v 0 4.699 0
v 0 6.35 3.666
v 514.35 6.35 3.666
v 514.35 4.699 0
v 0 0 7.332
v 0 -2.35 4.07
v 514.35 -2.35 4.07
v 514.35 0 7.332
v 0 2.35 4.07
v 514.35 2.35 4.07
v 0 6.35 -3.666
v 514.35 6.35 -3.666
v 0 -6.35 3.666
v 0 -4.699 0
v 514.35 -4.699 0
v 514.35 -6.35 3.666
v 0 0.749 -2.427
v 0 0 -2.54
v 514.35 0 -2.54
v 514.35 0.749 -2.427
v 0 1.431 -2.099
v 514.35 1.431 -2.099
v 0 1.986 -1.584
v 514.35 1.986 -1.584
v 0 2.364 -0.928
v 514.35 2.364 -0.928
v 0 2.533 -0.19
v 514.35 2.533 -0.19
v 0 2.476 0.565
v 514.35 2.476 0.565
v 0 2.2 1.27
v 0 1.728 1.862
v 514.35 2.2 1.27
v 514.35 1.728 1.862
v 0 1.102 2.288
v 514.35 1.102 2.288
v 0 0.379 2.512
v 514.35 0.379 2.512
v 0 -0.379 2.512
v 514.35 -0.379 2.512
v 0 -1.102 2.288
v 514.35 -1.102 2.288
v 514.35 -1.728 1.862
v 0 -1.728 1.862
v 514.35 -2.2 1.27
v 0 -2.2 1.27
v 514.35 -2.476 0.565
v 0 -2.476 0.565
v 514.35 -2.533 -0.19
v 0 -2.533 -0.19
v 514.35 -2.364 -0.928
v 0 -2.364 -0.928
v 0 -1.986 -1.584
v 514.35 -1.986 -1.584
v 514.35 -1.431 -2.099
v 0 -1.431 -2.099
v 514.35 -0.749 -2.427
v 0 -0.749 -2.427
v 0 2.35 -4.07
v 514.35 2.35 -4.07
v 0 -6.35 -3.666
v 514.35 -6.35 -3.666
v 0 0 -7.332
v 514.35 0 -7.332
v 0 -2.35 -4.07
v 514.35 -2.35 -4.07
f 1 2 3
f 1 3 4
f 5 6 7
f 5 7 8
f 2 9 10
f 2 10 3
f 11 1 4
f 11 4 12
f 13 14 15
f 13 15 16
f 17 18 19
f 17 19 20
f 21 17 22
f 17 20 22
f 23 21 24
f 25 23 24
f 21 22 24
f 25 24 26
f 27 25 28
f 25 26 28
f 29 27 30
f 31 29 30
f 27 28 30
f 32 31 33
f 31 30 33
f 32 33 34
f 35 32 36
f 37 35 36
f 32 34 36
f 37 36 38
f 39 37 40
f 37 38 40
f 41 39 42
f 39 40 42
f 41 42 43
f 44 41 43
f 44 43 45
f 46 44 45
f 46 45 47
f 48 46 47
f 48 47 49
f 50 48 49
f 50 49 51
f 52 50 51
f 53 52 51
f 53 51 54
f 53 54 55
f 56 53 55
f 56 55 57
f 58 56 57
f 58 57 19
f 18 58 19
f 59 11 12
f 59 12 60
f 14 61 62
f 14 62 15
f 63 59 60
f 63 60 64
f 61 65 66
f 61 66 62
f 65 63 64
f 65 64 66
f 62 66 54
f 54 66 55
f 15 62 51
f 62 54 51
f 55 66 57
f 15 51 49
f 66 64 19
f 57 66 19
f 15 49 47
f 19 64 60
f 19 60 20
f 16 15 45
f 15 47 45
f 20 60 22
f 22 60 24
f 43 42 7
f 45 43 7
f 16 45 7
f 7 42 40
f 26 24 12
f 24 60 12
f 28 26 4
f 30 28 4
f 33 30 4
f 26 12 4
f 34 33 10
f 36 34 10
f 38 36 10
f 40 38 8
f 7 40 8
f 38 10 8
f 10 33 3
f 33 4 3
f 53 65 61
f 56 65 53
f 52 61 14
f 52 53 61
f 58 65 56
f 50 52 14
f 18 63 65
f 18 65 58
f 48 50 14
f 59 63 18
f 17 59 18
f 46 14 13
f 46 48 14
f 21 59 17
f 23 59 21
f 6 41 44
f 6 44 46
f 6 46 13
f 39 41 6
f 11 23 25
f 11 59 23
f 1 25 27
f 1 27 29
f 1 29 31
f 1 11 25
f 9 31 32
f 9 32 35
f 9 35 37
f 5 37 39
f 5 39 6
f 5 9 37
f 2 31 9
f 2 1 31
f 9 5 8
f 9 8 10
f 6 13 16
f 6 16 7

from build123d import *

# Parameters (mm, degrees)
BOSS_EXTRUDE1_DEPTH = 514.35
CUT_EXTRUDE1_REACH  = 516.35
SKETCH2_R           = 2.54


with BuildPart() as part:
    # Sketch1 → Boss-Extrude1 (new body)
    with BuildSketch(Plane(origin=(0, 0, 0), x_dir=(0, 0, -1), z_dir=(1, 0, 0))):
        Polygon((-3.666174209, 6.35), (0, 4.699060448), (3.666174209, 6.35), (4.069505722, 2.349530224), (7.332348419, 0), (4.069505722, -2.349530224), (3.666174209, -6.35), (0, -4.699060448), (-3.666174209, -6.35), (-4.069505722, -2.349530224), (-7.332348419, 0), (-4.069505722, 2.349530224), align=None)
    extrude(amount=BOSS_EXTRUDE1_DEPTH)

    # Sketch2 → Cut-Extrude1 (cut, up to next)
    with BuildSketch(Plane(origin=(514.35, 0, 0), x_dir=(0, 0, -1), z_dir=(1, 0, 0)), mode=Mode.PRIVATE) as cut_extrude1_sk1:
        Circle(SKETCH2_R)
    cut_extrude1_tool1 = extrude(cut_extrude1_sk1.sketch, amount=-CUT_EXTRUDE1_REACH, mode=Mode.PRIVATE) & part.part
    add(cut_extrude1_tool1.solids().sort_by_distance((514.35, 0, 0))[0], mode=Mode.SUBTRACT)


solid = part.part
